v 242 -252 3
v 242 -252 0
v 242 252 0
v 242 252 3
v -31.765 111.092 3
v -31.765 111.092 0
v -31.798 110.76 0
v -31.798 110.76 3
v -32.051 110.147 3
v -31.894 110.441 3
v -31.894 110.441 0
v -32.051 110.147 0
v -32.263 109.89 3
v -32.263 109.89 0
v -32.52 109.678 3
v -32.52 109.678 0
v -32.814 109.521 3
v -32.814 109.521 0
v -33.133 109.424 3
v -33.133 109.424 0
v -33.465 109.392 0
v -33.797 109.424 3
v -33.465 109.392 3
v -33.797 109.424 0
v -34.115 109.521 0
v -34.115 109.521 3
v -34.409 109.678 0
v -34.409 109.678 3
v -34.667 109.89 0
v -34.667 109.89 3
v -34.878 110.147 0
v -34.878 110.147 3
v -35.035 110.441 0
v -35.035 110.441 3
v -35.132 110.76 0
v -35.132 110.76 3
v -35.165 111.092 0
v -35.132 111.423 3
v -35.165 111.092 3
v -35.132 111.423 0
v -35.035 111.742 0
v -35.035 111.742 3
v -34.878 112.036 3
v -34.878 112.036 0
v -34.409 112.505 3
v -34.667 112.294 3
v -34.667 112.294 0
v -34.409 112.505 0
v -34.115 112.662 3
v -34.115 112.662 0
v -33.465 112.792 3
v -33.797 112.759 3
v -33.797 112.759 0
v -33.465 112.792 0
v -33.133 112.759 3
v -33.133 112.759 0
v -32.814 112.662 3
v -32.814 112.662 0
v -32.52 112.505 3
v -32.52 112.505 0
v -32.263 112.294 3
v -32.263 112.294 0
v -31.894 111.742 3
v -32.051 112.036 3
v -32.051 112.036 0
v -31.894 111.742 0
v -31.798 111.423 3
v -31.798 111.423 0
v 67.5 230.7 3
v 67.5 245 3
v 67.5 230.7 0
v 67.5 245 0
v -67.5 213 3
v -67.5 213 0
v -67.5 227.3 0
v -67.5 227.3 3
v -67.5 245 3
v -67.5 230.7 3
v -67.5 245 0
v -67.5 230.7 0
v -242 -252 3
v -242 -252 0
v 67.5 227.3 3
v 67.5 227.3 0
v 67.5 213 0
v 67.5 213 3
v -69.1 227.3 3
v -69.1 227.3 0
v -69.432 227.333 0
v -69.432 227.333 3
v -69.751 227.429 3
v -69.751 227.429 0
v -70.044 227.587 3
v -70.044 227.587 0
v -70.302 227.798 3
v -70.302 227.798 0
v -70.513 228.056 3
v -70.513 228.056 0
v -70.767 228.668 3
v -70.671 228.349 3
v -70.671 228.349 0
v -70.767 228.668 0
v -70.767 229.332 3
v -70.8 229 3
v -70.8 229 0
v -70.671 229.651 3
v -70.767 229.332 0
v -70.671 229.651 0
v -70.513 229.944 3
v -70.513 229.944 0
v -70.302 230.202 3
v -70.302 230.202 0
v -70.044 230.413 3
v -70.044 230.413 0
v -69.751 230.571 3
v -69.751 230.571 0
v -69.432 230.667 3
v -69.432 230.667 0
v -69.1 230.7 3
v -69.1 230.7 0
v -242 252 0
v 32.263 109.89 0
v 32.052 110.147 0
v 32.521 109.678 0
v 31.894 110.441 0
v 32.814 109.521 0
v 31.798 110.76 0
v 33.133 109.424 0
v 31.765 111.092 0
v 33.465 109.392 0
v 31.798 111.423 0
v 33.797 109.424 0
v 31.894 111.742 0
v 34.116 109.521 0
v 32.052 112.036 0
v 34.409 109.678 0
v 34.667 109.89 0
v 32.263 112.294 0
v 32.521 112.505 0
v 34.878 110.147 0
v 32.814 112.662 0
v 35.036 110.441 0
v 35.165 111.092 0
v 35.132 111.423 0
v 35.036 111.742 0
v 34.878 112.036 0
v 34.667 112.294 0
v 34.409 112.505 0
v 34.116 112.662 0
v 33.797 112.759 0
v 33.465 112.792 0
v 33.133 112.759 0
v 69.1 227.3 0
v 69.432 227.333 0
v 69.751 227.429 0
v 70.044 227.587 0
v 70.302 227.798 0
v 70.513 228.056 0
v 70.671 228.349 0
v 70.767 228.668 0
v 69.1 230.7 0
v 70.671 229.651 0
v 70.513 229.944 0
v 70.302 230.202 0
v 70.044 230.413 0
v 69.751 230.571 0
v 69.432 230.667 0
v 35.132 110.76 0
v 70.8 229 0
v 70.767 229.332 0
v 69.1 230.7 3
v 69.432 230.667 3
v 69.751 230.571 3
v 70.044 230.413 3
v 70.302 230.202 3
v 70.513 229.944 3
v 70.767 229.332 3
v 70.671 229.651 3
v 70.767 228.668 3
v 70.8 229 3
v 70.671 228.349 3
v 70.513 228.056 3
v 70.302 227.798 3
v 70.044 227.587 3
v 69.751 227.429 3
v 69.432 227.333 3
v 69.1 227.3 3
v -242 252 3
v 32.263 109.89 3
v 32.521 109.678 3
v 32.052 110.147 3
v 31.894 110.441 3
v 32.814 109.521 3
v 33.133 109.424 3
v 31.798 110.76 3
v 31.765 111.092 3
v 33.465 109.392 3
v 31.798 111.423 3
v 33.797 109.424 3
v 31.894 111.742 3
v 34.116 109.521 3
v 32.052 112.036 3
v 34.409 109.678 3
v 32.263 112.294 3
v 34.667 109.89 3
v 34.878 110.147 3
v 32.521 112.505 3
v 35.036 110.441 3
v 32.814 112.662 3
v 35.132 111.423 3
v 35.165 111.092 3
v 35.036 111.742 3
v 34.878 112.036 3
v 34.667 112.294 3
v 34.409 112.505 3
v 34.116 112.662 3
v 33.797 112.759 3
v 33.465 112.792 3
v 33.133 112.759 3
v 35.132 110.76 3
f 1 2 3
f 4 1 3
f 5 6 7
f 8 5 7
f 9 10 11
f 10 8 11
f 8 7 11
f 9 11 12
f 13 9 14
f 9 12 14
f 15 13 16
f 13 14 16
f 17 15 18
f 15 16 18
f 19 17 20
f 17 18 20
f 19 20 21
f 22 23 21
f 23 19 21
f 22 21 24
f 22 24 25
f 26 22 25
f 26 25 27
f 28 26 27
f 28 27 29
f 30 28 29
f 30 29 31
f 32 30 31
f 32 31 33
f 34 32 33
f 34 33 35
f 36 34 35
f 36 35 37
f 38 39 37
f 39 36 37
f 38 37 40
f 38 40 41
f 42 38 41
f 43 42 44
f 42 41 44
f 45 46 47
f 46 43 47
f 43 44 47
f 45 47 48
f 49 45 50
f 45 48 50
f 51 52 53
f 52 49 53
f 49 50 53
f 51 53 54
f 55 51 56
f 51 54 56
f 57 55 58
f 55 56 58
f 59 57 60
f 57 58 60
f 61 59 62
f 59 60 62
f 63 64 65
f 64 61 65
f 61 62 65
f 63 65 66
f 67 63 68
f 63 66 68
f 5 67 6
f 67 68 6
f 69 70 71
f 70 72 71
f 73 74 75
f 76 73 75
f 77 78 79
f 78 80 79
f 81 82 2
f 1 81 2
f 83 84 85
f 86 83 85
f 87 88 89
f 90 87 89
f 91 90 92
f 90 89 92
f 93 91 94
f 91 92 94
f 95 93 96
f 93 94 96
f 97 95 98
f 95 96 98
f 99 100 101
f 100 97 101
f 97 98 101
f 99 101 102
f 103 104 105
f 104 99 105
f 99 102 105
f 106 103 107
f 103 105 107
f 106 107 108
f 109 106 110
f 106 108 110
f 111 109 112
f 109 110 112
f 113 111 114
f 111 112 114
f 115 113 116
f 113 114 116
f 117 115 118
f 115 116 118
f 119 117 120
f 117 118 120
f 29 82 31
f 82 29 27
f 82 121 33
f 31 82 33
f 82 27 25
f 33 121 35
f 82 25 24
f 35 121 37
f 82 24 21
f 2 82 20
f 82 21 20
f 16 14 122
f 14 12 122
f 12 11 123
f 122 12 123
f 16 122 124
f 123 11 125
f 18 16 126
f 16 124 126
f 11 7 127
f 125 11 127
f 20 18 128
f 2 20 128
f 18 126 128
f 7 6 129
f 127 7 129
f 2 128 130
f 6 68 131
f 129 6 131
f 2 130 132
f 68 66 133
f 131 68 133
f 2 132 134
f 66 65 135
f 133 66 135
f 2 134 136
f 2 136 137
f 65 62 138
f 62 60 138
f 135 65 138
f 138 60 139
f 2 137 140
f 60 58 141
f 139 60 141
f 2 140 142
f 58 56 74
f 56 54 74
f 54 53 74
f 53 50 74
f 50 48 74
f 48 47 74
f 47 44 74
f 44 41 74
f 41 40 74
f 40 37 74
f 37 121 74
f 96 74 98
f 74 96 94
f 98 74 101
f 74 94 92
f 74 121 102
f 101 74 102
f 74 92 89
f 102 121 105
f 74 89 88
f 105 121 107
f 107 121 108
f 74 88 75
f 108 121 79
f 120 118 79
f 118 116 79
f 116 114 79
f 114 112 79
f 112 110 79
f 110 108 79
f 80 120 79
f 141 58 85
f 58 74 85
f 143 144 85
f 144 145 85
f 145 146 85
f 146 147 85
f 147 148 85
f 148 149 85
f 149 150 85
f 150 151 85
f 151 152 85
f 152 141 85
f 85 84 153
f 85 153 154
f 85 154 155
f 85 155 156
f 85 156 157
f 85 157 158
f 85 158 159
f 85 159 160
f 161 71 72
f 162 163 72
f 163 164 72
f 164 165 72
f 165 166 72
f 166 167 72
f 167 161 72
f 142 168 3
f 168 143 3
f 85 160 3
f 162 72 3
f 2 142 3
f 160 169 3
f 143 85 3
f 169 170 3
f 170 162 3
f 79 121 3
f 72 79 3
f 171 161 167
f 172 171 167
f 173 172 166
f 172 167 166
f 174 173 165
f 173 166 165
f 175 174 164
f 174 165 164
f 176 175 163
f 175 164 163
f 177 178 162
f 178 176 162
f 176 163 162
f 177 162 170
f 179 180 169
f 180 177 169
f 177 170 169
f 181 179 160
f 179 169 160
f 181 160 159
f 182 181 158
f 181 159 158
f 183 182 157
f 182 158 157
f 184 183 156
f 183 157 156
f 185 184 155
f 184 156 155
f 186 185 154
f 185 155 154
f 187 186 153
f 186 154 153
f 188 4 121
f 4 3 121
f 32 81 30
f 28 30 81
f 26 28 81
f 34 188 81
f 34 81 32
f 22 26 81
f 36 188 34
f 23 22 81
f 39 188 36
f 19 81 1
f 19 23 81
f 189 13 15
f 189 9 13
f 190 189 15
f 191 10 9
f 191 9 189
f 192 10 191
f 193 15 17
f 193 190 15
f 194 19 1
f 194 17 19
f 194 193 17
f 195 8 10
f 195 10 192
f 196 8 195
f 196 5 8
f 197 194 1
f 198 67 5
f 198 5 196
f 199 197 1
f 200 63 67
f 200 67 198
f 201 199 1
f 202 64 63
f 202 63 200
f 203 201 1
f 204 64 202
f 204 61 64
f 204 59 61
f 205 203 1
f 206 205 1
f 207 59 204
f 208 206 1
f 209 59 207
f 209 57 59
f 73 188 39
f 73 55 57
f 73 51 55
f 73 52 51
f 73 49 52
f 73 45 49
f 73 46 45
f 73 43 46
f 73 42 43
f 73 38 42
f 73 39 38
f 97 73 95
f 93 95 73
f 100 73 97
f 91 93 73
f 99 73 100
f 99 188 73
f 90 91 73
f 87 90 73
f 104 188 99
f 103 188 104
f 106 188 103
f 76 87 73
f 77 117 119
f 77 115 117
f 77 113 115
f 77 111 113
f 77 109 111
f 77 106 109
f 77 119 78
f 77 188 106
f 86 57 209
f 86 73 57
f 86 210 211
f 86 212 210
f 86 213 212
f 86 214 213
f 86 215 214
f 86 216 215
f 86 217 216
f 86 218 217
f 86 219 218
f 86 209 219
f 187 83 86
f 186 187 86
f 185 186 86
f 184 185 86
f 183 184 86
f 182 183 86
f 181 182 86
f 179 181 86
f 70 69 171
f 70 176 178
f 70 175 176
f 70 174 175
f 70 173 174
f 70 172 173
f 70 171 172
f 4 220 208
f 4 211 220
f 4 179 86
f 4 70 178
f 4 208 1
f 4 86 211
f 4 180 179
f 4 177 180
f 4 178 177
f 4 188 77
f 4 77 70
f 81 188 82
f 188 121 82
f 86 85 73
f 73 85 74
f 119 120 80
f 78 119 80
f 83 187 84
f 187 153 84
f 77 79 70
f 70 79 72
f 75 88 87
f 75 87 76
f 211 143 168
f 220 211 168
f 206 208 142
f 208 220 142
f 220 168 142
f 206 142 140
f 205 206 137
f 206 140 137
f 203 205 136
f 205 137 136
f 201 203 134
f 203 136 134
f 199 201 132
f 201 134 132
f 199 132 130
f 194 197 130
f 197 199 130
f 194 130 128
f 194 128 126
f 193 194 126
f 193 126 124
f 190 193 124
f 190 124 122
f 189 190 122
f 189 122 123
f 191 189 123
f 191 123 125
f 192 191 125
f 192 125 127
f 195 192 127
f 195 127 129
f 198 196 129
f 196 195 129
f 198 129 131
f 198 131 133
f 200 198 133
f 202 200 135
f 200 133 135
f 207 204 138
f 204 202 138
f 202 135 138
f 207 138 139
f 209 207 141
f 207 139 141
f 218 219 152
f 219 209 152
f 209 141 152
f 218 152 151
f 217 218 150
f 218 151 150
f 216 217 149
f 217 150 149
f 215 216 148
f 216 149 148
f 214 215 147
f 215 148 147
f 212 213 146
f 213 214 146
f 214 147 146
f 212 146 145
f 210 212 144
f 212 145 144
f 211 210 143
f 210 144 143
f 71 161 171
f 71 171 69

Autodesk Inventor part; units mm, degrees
ref_plane "YZ Plane" through (0, 0, 0) normal (1, 0, 0) x (0, 1, 0)
ref_plane "XZ Plane" through (0, 0, 0) normal (0, 1, 0) x (-1, 0, 0)
ref_plane "XY Plane" through (0, 0, 0) normal (0, 0, 1) x (1, 0, 0)
sketch "Skizze1" plane through (0, 0, 0) normal (0, 0, 1) x (1, 0, 0)
  line L0 (-242, -252) -> (242, -252)
  line L1 (242, -252) -> (242, 252)
  line L2 (242, 252) -> (-242, 252)
  line L3 (-242, 252) -> (-242, -252)
  line L4 (-242, -252) -> (242, 252) construction
  line L5 (242, -252) -> (-242, 252) construction
  line L6 (-67.5, 245) -> (67.5, 245)
  line L7 (67.5, 213) -> (-67.5, 213)
  line L8 (0, 245) -> (0, 213) construction
  line L9 (69.1, 229) -> (-69.1, 229) construction
  line L10 (-69.1, 230.7) -> (-67.5, 230.7)
  line L11 (-69.1, 227.3) -> (-67.5, 227.3)
  line L12 (69.1, 230.7) -> (67.5, 230.7)
  line L13 (69.1, 227.3) -> (67.5, 227.3)
  line L14 (67.5, 245) -> (67.5, 230.7)
  line L15 (67.5, 227.3) -> (67.5, 213)
  arc A0 (69.1, 227.3) -> (69.1, 230.7) centre (69.1, 229) ccw
  arc A1 (-69.1, 230.7) -> (-69.1, 227.3) centre (-69.1, 229) ccw
  line L16 (-67.5, 230.7) -> (-67.5, 245)
  line L17 (-67.5, 213) -> (-67.5, 227.3)
  circle A2 centre (-33.4649, 111.0916) radius 1.7
  circle A3 centre (33.465, 111.0916) radius 1.7
  point P0 (0, 0)
  point P1 (0, 252)
  point P2 (0, 229)
  dimension "d0" = 484
  dimension "d1" = 504
  dimension "d6" = 135
  dimension "d7" = 32
  dimension "d8" = 138.2
  dimension "d10" = 3.4
  dimension "d11" = 117.9083
  dimension "d13" = 3.4
  dimension "d15" = 66.9299
  dimension "d16" = 7
extrude "Extrusion1" add sketch "Skizze1" along normal blind 3
properties part number "Panel Back" material "Polycarbonat, klar"
